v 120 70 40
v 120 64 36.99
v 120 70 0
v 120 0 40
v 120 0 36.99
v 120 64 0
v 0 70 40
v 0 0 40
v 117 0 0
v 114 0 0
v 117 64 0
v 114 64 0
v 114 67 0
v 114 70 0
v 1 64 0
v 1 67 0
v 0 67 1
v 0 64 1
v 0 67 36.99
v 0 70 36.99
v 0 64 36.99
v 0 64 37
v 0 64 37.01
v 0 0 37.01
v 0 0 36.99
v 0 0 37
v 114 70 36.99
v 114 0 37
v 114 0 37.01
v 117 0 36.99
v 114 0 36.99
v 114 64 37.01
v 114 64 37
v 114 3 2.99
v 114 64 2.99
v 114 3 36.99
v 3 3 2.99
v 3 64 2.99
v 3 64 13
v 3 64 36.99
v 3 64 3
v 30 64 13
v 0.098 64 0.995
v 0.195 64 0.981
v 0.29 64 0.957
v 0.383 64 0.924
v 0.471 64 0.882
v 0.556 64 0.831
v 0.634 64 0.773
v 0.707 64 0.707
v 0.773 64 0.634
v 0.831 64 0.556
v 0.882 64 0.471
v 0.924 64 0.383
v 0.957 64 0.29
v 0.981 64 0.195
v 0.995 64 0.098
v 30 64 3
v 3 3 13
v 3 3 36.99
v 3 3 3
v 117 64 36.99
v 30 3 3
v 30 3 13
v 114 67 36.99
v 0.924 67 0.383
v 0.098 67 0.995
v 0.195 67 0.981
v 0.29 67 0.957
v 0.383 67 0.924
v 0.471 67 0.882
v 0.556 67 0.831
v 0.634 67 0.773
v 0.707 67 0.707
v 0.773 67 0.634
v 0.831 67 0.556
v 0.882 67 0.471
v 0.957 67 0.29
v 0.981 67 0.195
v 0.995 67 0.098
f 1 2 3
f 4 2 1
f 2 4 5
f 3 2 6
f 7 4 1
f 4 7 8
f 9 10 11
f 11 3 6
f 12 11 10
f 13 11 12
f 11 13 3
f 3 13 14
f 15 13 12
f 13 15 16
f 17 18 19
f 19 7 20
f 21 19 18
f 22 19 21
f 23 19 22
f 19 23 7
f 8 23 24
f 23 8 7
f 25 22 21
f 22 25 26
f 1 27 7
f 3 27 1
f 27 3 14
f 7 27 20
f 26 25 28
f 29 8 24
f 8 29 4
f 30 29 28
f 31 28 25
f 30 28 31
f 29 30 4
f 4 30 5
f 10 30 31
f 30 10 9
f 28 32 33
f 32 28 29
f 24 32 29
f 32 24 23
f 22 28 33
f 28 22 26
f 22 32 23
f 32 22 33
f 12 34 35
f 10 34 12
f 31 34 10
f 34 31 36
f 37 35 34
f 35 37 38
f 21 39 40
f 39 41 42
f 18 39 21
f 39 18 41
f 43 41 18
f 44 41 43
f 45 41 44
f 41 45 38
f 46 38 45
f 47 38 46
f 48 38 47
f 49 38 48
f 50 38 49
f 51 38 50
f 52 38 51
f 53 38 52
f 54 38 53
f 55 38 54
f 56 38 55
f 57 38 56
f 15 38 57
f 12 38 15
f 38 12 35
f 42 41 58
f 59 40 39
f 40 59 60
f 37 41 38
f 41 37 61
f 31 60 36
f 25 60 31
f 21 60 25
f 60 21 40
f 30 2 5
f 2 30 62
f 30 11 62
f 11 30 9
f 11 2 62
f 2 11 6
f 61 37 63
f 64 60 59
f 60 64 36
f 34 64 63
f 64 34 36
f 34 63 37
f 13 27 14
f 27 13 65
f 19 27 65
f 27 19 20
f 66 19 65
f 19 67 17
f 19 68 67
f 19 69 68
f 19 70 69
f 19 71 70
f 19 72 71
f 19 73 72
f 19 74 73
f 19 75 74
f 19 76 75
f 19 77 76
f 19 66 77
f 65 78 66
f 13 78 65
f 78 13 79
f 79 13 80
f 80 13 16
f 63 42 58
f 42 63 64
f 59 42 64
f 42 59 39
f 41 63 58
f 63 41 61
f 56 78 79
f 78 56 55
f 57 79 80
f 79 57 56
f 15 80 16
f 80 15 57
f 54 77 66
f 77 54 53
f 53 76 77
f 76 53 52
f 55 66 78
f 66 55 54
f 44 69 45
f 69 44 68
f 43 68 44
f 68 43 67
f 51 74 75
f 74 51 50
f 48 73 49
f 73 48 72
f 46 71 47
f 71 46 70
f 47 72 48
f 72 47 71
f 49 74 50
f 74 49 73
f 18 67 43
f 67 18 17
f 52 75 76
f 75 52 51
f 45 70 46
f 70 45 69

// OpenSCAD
// Buffer Tank for Mini Horizontal Gel Electrophoresis
// Units: millimetres

// Outer Dimensions
$outer_x = 120;
$outer_y = 70;
$outer_z = 40;

// Wall and Floor Thickness
$wall_thick = 3;
$floor_thick = 3;

// Platform Dimensions
$platform_len = 60;      // Length in X
$platform_pos_x = 0;     // Centered in X
$platform_height = 10;   // Height above inner floor
$platform_z_base = $outer_z - $floor_thick - $platform_height; // Z position of platform top

// Hole Dimensions
$hole_dia = 2;
$hole_y = 0;
$hole_z = 30;

// Rendering settings
$fn = 64;

// Calculate Inner Dimensions
$inner_x = $outer_x - 2 * $wall_thick;
$inner_y = $outer_y - 2 * $wall_thick;
$inner_z = $outer_z - $floor_thick;

// Calculate Platform Inner Width (matches tank inner width)
$platform_w = $inner_y;

// Build the tank
difference() {
    // 1. Create the main outer block
    cube([
        $outer_x, 
        $outer_y, 
        $outer_z
    ]);

    // 2. Cut out the top opening (open-top tank)
    translate([0, 0, $outer_z - $floor_thick]) {
        cube([
            $inner_x, 
            $inner_y, 
            0.01 // Slightly less than wall thickness to leave walls
        ]);
    }

    // 3. Cut out the bottom floor
    translate([0, 0, 0]) {
        cube([
            $inner_x, 
            $inner_y, 
            $floor_thick - 0.01 // Slightly less than floor thickness
        ]);
    }

    // 4. Cut out the side walls (to create the inner cavity)
    // Left Wall
    translate([0, 0, 0]) {
        cube([
            $wall_thick, 
            $inner_y, 
            $outer_z - $floor_thick - 0.01
        ]);
    }
    // Right Wall
    translate([$outer_x - $wall_thick, 0, 0]) {
        cube([
            $wall_thick, 
            $inner_y, 
            $outer_z - $floor_thick - 0.01
        ]);
    }
    // Front Wall
    translate([0, 0, 0]) {
        cube([
            $inner_x, 
            $wall_thick, 
            $outer_z - $floor_thick - 0.01
        ]);
    }
    // Back Wall
    translate([0, $outer_y - $wall_thick, 0]) {
        cube([
            $inner_x, 
            $wall_thick, 
            $outer_z - $floor_thick - 0.01
        ]);
    }

    // 5. Cut out the central platform (it is solid, so we subtract it)
    // The platform sits on the floor, so its bottom is at z = $floor_thick
    // Its top is at z = $floor_thick + $platform_height
    translate([
        $platform_pos_x - $platform_len / 2, 
        0, 
        $floor_thick
    ]) {
        cube([
            $platform_len, 
            $platform_w, 
            $platform_height
        ]);
    }

    // 6. Drill electrode holes
    // Hole position: y = $hole_y, z = $hole_z
    // We need to cut a cylinder through the end walls.
    // The hole is horizontal along X.
    // We place the cylinder such that it passes through the wall at the ends.
    // The tank ends are at x = $wall_thick and x = $outer_x - $wall_thick.
    // The hole is centered in Y ($hole_y) and at height $hole_z.
    
    // Left End Hole
    translate([
        $hole_y, 
        $hole_z, 
        0 // Cylinder axis is X, so Z is the height in our local frame, but we need to rotate
    ]) {
        // Rotate to align cylinder axis with X
        rotate([90, 0, 0]) {
            cylinder(
                h = $outer_x + 10, // Extend past both ends
                r = $hole_dia / 2,
                center = true
            );
        }
    }
    
    // Right End Hole (Duplicate for symmetry/clarity, though one long cylinder covers both)
    // Actually, a single long cylinder centered at the hole coordinates works perfectly.
    // The translation above [hole_y, hole_z, 0] with rotation [90,0,0] creates a cylinder along X.
    // We just need to ensure it's centered correctly.
    // The previous block was correct for a single long hole.
    
    // Let's refine the hole logic to be absolutely sure it cuts through the specific walls.
    // The hole is at y=$hole_y, z=$hole_z.
    // We need to remove material where x is between the walls? No, the hole goes THROUGH the walls.
    // So we need a cylinder that spans the entire X length of the tank, centered at the specific Y and Z.
    
    // Re-doing the hole subtraction to be precise:
    // Position: y = $hole_y, z = $hole_z.
    // Axis: X.
    // Length: Must cover the whole tank width in X.
    
    translate([
        $hole_y, 
        $hole_z, 
        0
    ]) {
        rotate([90, 0, 0]) {
            cylinder(
                h = $outer_x + 5, // Extend slightly past ends
                r = $hole_dia / 2,
                center = true
            );
        }
    }
}
